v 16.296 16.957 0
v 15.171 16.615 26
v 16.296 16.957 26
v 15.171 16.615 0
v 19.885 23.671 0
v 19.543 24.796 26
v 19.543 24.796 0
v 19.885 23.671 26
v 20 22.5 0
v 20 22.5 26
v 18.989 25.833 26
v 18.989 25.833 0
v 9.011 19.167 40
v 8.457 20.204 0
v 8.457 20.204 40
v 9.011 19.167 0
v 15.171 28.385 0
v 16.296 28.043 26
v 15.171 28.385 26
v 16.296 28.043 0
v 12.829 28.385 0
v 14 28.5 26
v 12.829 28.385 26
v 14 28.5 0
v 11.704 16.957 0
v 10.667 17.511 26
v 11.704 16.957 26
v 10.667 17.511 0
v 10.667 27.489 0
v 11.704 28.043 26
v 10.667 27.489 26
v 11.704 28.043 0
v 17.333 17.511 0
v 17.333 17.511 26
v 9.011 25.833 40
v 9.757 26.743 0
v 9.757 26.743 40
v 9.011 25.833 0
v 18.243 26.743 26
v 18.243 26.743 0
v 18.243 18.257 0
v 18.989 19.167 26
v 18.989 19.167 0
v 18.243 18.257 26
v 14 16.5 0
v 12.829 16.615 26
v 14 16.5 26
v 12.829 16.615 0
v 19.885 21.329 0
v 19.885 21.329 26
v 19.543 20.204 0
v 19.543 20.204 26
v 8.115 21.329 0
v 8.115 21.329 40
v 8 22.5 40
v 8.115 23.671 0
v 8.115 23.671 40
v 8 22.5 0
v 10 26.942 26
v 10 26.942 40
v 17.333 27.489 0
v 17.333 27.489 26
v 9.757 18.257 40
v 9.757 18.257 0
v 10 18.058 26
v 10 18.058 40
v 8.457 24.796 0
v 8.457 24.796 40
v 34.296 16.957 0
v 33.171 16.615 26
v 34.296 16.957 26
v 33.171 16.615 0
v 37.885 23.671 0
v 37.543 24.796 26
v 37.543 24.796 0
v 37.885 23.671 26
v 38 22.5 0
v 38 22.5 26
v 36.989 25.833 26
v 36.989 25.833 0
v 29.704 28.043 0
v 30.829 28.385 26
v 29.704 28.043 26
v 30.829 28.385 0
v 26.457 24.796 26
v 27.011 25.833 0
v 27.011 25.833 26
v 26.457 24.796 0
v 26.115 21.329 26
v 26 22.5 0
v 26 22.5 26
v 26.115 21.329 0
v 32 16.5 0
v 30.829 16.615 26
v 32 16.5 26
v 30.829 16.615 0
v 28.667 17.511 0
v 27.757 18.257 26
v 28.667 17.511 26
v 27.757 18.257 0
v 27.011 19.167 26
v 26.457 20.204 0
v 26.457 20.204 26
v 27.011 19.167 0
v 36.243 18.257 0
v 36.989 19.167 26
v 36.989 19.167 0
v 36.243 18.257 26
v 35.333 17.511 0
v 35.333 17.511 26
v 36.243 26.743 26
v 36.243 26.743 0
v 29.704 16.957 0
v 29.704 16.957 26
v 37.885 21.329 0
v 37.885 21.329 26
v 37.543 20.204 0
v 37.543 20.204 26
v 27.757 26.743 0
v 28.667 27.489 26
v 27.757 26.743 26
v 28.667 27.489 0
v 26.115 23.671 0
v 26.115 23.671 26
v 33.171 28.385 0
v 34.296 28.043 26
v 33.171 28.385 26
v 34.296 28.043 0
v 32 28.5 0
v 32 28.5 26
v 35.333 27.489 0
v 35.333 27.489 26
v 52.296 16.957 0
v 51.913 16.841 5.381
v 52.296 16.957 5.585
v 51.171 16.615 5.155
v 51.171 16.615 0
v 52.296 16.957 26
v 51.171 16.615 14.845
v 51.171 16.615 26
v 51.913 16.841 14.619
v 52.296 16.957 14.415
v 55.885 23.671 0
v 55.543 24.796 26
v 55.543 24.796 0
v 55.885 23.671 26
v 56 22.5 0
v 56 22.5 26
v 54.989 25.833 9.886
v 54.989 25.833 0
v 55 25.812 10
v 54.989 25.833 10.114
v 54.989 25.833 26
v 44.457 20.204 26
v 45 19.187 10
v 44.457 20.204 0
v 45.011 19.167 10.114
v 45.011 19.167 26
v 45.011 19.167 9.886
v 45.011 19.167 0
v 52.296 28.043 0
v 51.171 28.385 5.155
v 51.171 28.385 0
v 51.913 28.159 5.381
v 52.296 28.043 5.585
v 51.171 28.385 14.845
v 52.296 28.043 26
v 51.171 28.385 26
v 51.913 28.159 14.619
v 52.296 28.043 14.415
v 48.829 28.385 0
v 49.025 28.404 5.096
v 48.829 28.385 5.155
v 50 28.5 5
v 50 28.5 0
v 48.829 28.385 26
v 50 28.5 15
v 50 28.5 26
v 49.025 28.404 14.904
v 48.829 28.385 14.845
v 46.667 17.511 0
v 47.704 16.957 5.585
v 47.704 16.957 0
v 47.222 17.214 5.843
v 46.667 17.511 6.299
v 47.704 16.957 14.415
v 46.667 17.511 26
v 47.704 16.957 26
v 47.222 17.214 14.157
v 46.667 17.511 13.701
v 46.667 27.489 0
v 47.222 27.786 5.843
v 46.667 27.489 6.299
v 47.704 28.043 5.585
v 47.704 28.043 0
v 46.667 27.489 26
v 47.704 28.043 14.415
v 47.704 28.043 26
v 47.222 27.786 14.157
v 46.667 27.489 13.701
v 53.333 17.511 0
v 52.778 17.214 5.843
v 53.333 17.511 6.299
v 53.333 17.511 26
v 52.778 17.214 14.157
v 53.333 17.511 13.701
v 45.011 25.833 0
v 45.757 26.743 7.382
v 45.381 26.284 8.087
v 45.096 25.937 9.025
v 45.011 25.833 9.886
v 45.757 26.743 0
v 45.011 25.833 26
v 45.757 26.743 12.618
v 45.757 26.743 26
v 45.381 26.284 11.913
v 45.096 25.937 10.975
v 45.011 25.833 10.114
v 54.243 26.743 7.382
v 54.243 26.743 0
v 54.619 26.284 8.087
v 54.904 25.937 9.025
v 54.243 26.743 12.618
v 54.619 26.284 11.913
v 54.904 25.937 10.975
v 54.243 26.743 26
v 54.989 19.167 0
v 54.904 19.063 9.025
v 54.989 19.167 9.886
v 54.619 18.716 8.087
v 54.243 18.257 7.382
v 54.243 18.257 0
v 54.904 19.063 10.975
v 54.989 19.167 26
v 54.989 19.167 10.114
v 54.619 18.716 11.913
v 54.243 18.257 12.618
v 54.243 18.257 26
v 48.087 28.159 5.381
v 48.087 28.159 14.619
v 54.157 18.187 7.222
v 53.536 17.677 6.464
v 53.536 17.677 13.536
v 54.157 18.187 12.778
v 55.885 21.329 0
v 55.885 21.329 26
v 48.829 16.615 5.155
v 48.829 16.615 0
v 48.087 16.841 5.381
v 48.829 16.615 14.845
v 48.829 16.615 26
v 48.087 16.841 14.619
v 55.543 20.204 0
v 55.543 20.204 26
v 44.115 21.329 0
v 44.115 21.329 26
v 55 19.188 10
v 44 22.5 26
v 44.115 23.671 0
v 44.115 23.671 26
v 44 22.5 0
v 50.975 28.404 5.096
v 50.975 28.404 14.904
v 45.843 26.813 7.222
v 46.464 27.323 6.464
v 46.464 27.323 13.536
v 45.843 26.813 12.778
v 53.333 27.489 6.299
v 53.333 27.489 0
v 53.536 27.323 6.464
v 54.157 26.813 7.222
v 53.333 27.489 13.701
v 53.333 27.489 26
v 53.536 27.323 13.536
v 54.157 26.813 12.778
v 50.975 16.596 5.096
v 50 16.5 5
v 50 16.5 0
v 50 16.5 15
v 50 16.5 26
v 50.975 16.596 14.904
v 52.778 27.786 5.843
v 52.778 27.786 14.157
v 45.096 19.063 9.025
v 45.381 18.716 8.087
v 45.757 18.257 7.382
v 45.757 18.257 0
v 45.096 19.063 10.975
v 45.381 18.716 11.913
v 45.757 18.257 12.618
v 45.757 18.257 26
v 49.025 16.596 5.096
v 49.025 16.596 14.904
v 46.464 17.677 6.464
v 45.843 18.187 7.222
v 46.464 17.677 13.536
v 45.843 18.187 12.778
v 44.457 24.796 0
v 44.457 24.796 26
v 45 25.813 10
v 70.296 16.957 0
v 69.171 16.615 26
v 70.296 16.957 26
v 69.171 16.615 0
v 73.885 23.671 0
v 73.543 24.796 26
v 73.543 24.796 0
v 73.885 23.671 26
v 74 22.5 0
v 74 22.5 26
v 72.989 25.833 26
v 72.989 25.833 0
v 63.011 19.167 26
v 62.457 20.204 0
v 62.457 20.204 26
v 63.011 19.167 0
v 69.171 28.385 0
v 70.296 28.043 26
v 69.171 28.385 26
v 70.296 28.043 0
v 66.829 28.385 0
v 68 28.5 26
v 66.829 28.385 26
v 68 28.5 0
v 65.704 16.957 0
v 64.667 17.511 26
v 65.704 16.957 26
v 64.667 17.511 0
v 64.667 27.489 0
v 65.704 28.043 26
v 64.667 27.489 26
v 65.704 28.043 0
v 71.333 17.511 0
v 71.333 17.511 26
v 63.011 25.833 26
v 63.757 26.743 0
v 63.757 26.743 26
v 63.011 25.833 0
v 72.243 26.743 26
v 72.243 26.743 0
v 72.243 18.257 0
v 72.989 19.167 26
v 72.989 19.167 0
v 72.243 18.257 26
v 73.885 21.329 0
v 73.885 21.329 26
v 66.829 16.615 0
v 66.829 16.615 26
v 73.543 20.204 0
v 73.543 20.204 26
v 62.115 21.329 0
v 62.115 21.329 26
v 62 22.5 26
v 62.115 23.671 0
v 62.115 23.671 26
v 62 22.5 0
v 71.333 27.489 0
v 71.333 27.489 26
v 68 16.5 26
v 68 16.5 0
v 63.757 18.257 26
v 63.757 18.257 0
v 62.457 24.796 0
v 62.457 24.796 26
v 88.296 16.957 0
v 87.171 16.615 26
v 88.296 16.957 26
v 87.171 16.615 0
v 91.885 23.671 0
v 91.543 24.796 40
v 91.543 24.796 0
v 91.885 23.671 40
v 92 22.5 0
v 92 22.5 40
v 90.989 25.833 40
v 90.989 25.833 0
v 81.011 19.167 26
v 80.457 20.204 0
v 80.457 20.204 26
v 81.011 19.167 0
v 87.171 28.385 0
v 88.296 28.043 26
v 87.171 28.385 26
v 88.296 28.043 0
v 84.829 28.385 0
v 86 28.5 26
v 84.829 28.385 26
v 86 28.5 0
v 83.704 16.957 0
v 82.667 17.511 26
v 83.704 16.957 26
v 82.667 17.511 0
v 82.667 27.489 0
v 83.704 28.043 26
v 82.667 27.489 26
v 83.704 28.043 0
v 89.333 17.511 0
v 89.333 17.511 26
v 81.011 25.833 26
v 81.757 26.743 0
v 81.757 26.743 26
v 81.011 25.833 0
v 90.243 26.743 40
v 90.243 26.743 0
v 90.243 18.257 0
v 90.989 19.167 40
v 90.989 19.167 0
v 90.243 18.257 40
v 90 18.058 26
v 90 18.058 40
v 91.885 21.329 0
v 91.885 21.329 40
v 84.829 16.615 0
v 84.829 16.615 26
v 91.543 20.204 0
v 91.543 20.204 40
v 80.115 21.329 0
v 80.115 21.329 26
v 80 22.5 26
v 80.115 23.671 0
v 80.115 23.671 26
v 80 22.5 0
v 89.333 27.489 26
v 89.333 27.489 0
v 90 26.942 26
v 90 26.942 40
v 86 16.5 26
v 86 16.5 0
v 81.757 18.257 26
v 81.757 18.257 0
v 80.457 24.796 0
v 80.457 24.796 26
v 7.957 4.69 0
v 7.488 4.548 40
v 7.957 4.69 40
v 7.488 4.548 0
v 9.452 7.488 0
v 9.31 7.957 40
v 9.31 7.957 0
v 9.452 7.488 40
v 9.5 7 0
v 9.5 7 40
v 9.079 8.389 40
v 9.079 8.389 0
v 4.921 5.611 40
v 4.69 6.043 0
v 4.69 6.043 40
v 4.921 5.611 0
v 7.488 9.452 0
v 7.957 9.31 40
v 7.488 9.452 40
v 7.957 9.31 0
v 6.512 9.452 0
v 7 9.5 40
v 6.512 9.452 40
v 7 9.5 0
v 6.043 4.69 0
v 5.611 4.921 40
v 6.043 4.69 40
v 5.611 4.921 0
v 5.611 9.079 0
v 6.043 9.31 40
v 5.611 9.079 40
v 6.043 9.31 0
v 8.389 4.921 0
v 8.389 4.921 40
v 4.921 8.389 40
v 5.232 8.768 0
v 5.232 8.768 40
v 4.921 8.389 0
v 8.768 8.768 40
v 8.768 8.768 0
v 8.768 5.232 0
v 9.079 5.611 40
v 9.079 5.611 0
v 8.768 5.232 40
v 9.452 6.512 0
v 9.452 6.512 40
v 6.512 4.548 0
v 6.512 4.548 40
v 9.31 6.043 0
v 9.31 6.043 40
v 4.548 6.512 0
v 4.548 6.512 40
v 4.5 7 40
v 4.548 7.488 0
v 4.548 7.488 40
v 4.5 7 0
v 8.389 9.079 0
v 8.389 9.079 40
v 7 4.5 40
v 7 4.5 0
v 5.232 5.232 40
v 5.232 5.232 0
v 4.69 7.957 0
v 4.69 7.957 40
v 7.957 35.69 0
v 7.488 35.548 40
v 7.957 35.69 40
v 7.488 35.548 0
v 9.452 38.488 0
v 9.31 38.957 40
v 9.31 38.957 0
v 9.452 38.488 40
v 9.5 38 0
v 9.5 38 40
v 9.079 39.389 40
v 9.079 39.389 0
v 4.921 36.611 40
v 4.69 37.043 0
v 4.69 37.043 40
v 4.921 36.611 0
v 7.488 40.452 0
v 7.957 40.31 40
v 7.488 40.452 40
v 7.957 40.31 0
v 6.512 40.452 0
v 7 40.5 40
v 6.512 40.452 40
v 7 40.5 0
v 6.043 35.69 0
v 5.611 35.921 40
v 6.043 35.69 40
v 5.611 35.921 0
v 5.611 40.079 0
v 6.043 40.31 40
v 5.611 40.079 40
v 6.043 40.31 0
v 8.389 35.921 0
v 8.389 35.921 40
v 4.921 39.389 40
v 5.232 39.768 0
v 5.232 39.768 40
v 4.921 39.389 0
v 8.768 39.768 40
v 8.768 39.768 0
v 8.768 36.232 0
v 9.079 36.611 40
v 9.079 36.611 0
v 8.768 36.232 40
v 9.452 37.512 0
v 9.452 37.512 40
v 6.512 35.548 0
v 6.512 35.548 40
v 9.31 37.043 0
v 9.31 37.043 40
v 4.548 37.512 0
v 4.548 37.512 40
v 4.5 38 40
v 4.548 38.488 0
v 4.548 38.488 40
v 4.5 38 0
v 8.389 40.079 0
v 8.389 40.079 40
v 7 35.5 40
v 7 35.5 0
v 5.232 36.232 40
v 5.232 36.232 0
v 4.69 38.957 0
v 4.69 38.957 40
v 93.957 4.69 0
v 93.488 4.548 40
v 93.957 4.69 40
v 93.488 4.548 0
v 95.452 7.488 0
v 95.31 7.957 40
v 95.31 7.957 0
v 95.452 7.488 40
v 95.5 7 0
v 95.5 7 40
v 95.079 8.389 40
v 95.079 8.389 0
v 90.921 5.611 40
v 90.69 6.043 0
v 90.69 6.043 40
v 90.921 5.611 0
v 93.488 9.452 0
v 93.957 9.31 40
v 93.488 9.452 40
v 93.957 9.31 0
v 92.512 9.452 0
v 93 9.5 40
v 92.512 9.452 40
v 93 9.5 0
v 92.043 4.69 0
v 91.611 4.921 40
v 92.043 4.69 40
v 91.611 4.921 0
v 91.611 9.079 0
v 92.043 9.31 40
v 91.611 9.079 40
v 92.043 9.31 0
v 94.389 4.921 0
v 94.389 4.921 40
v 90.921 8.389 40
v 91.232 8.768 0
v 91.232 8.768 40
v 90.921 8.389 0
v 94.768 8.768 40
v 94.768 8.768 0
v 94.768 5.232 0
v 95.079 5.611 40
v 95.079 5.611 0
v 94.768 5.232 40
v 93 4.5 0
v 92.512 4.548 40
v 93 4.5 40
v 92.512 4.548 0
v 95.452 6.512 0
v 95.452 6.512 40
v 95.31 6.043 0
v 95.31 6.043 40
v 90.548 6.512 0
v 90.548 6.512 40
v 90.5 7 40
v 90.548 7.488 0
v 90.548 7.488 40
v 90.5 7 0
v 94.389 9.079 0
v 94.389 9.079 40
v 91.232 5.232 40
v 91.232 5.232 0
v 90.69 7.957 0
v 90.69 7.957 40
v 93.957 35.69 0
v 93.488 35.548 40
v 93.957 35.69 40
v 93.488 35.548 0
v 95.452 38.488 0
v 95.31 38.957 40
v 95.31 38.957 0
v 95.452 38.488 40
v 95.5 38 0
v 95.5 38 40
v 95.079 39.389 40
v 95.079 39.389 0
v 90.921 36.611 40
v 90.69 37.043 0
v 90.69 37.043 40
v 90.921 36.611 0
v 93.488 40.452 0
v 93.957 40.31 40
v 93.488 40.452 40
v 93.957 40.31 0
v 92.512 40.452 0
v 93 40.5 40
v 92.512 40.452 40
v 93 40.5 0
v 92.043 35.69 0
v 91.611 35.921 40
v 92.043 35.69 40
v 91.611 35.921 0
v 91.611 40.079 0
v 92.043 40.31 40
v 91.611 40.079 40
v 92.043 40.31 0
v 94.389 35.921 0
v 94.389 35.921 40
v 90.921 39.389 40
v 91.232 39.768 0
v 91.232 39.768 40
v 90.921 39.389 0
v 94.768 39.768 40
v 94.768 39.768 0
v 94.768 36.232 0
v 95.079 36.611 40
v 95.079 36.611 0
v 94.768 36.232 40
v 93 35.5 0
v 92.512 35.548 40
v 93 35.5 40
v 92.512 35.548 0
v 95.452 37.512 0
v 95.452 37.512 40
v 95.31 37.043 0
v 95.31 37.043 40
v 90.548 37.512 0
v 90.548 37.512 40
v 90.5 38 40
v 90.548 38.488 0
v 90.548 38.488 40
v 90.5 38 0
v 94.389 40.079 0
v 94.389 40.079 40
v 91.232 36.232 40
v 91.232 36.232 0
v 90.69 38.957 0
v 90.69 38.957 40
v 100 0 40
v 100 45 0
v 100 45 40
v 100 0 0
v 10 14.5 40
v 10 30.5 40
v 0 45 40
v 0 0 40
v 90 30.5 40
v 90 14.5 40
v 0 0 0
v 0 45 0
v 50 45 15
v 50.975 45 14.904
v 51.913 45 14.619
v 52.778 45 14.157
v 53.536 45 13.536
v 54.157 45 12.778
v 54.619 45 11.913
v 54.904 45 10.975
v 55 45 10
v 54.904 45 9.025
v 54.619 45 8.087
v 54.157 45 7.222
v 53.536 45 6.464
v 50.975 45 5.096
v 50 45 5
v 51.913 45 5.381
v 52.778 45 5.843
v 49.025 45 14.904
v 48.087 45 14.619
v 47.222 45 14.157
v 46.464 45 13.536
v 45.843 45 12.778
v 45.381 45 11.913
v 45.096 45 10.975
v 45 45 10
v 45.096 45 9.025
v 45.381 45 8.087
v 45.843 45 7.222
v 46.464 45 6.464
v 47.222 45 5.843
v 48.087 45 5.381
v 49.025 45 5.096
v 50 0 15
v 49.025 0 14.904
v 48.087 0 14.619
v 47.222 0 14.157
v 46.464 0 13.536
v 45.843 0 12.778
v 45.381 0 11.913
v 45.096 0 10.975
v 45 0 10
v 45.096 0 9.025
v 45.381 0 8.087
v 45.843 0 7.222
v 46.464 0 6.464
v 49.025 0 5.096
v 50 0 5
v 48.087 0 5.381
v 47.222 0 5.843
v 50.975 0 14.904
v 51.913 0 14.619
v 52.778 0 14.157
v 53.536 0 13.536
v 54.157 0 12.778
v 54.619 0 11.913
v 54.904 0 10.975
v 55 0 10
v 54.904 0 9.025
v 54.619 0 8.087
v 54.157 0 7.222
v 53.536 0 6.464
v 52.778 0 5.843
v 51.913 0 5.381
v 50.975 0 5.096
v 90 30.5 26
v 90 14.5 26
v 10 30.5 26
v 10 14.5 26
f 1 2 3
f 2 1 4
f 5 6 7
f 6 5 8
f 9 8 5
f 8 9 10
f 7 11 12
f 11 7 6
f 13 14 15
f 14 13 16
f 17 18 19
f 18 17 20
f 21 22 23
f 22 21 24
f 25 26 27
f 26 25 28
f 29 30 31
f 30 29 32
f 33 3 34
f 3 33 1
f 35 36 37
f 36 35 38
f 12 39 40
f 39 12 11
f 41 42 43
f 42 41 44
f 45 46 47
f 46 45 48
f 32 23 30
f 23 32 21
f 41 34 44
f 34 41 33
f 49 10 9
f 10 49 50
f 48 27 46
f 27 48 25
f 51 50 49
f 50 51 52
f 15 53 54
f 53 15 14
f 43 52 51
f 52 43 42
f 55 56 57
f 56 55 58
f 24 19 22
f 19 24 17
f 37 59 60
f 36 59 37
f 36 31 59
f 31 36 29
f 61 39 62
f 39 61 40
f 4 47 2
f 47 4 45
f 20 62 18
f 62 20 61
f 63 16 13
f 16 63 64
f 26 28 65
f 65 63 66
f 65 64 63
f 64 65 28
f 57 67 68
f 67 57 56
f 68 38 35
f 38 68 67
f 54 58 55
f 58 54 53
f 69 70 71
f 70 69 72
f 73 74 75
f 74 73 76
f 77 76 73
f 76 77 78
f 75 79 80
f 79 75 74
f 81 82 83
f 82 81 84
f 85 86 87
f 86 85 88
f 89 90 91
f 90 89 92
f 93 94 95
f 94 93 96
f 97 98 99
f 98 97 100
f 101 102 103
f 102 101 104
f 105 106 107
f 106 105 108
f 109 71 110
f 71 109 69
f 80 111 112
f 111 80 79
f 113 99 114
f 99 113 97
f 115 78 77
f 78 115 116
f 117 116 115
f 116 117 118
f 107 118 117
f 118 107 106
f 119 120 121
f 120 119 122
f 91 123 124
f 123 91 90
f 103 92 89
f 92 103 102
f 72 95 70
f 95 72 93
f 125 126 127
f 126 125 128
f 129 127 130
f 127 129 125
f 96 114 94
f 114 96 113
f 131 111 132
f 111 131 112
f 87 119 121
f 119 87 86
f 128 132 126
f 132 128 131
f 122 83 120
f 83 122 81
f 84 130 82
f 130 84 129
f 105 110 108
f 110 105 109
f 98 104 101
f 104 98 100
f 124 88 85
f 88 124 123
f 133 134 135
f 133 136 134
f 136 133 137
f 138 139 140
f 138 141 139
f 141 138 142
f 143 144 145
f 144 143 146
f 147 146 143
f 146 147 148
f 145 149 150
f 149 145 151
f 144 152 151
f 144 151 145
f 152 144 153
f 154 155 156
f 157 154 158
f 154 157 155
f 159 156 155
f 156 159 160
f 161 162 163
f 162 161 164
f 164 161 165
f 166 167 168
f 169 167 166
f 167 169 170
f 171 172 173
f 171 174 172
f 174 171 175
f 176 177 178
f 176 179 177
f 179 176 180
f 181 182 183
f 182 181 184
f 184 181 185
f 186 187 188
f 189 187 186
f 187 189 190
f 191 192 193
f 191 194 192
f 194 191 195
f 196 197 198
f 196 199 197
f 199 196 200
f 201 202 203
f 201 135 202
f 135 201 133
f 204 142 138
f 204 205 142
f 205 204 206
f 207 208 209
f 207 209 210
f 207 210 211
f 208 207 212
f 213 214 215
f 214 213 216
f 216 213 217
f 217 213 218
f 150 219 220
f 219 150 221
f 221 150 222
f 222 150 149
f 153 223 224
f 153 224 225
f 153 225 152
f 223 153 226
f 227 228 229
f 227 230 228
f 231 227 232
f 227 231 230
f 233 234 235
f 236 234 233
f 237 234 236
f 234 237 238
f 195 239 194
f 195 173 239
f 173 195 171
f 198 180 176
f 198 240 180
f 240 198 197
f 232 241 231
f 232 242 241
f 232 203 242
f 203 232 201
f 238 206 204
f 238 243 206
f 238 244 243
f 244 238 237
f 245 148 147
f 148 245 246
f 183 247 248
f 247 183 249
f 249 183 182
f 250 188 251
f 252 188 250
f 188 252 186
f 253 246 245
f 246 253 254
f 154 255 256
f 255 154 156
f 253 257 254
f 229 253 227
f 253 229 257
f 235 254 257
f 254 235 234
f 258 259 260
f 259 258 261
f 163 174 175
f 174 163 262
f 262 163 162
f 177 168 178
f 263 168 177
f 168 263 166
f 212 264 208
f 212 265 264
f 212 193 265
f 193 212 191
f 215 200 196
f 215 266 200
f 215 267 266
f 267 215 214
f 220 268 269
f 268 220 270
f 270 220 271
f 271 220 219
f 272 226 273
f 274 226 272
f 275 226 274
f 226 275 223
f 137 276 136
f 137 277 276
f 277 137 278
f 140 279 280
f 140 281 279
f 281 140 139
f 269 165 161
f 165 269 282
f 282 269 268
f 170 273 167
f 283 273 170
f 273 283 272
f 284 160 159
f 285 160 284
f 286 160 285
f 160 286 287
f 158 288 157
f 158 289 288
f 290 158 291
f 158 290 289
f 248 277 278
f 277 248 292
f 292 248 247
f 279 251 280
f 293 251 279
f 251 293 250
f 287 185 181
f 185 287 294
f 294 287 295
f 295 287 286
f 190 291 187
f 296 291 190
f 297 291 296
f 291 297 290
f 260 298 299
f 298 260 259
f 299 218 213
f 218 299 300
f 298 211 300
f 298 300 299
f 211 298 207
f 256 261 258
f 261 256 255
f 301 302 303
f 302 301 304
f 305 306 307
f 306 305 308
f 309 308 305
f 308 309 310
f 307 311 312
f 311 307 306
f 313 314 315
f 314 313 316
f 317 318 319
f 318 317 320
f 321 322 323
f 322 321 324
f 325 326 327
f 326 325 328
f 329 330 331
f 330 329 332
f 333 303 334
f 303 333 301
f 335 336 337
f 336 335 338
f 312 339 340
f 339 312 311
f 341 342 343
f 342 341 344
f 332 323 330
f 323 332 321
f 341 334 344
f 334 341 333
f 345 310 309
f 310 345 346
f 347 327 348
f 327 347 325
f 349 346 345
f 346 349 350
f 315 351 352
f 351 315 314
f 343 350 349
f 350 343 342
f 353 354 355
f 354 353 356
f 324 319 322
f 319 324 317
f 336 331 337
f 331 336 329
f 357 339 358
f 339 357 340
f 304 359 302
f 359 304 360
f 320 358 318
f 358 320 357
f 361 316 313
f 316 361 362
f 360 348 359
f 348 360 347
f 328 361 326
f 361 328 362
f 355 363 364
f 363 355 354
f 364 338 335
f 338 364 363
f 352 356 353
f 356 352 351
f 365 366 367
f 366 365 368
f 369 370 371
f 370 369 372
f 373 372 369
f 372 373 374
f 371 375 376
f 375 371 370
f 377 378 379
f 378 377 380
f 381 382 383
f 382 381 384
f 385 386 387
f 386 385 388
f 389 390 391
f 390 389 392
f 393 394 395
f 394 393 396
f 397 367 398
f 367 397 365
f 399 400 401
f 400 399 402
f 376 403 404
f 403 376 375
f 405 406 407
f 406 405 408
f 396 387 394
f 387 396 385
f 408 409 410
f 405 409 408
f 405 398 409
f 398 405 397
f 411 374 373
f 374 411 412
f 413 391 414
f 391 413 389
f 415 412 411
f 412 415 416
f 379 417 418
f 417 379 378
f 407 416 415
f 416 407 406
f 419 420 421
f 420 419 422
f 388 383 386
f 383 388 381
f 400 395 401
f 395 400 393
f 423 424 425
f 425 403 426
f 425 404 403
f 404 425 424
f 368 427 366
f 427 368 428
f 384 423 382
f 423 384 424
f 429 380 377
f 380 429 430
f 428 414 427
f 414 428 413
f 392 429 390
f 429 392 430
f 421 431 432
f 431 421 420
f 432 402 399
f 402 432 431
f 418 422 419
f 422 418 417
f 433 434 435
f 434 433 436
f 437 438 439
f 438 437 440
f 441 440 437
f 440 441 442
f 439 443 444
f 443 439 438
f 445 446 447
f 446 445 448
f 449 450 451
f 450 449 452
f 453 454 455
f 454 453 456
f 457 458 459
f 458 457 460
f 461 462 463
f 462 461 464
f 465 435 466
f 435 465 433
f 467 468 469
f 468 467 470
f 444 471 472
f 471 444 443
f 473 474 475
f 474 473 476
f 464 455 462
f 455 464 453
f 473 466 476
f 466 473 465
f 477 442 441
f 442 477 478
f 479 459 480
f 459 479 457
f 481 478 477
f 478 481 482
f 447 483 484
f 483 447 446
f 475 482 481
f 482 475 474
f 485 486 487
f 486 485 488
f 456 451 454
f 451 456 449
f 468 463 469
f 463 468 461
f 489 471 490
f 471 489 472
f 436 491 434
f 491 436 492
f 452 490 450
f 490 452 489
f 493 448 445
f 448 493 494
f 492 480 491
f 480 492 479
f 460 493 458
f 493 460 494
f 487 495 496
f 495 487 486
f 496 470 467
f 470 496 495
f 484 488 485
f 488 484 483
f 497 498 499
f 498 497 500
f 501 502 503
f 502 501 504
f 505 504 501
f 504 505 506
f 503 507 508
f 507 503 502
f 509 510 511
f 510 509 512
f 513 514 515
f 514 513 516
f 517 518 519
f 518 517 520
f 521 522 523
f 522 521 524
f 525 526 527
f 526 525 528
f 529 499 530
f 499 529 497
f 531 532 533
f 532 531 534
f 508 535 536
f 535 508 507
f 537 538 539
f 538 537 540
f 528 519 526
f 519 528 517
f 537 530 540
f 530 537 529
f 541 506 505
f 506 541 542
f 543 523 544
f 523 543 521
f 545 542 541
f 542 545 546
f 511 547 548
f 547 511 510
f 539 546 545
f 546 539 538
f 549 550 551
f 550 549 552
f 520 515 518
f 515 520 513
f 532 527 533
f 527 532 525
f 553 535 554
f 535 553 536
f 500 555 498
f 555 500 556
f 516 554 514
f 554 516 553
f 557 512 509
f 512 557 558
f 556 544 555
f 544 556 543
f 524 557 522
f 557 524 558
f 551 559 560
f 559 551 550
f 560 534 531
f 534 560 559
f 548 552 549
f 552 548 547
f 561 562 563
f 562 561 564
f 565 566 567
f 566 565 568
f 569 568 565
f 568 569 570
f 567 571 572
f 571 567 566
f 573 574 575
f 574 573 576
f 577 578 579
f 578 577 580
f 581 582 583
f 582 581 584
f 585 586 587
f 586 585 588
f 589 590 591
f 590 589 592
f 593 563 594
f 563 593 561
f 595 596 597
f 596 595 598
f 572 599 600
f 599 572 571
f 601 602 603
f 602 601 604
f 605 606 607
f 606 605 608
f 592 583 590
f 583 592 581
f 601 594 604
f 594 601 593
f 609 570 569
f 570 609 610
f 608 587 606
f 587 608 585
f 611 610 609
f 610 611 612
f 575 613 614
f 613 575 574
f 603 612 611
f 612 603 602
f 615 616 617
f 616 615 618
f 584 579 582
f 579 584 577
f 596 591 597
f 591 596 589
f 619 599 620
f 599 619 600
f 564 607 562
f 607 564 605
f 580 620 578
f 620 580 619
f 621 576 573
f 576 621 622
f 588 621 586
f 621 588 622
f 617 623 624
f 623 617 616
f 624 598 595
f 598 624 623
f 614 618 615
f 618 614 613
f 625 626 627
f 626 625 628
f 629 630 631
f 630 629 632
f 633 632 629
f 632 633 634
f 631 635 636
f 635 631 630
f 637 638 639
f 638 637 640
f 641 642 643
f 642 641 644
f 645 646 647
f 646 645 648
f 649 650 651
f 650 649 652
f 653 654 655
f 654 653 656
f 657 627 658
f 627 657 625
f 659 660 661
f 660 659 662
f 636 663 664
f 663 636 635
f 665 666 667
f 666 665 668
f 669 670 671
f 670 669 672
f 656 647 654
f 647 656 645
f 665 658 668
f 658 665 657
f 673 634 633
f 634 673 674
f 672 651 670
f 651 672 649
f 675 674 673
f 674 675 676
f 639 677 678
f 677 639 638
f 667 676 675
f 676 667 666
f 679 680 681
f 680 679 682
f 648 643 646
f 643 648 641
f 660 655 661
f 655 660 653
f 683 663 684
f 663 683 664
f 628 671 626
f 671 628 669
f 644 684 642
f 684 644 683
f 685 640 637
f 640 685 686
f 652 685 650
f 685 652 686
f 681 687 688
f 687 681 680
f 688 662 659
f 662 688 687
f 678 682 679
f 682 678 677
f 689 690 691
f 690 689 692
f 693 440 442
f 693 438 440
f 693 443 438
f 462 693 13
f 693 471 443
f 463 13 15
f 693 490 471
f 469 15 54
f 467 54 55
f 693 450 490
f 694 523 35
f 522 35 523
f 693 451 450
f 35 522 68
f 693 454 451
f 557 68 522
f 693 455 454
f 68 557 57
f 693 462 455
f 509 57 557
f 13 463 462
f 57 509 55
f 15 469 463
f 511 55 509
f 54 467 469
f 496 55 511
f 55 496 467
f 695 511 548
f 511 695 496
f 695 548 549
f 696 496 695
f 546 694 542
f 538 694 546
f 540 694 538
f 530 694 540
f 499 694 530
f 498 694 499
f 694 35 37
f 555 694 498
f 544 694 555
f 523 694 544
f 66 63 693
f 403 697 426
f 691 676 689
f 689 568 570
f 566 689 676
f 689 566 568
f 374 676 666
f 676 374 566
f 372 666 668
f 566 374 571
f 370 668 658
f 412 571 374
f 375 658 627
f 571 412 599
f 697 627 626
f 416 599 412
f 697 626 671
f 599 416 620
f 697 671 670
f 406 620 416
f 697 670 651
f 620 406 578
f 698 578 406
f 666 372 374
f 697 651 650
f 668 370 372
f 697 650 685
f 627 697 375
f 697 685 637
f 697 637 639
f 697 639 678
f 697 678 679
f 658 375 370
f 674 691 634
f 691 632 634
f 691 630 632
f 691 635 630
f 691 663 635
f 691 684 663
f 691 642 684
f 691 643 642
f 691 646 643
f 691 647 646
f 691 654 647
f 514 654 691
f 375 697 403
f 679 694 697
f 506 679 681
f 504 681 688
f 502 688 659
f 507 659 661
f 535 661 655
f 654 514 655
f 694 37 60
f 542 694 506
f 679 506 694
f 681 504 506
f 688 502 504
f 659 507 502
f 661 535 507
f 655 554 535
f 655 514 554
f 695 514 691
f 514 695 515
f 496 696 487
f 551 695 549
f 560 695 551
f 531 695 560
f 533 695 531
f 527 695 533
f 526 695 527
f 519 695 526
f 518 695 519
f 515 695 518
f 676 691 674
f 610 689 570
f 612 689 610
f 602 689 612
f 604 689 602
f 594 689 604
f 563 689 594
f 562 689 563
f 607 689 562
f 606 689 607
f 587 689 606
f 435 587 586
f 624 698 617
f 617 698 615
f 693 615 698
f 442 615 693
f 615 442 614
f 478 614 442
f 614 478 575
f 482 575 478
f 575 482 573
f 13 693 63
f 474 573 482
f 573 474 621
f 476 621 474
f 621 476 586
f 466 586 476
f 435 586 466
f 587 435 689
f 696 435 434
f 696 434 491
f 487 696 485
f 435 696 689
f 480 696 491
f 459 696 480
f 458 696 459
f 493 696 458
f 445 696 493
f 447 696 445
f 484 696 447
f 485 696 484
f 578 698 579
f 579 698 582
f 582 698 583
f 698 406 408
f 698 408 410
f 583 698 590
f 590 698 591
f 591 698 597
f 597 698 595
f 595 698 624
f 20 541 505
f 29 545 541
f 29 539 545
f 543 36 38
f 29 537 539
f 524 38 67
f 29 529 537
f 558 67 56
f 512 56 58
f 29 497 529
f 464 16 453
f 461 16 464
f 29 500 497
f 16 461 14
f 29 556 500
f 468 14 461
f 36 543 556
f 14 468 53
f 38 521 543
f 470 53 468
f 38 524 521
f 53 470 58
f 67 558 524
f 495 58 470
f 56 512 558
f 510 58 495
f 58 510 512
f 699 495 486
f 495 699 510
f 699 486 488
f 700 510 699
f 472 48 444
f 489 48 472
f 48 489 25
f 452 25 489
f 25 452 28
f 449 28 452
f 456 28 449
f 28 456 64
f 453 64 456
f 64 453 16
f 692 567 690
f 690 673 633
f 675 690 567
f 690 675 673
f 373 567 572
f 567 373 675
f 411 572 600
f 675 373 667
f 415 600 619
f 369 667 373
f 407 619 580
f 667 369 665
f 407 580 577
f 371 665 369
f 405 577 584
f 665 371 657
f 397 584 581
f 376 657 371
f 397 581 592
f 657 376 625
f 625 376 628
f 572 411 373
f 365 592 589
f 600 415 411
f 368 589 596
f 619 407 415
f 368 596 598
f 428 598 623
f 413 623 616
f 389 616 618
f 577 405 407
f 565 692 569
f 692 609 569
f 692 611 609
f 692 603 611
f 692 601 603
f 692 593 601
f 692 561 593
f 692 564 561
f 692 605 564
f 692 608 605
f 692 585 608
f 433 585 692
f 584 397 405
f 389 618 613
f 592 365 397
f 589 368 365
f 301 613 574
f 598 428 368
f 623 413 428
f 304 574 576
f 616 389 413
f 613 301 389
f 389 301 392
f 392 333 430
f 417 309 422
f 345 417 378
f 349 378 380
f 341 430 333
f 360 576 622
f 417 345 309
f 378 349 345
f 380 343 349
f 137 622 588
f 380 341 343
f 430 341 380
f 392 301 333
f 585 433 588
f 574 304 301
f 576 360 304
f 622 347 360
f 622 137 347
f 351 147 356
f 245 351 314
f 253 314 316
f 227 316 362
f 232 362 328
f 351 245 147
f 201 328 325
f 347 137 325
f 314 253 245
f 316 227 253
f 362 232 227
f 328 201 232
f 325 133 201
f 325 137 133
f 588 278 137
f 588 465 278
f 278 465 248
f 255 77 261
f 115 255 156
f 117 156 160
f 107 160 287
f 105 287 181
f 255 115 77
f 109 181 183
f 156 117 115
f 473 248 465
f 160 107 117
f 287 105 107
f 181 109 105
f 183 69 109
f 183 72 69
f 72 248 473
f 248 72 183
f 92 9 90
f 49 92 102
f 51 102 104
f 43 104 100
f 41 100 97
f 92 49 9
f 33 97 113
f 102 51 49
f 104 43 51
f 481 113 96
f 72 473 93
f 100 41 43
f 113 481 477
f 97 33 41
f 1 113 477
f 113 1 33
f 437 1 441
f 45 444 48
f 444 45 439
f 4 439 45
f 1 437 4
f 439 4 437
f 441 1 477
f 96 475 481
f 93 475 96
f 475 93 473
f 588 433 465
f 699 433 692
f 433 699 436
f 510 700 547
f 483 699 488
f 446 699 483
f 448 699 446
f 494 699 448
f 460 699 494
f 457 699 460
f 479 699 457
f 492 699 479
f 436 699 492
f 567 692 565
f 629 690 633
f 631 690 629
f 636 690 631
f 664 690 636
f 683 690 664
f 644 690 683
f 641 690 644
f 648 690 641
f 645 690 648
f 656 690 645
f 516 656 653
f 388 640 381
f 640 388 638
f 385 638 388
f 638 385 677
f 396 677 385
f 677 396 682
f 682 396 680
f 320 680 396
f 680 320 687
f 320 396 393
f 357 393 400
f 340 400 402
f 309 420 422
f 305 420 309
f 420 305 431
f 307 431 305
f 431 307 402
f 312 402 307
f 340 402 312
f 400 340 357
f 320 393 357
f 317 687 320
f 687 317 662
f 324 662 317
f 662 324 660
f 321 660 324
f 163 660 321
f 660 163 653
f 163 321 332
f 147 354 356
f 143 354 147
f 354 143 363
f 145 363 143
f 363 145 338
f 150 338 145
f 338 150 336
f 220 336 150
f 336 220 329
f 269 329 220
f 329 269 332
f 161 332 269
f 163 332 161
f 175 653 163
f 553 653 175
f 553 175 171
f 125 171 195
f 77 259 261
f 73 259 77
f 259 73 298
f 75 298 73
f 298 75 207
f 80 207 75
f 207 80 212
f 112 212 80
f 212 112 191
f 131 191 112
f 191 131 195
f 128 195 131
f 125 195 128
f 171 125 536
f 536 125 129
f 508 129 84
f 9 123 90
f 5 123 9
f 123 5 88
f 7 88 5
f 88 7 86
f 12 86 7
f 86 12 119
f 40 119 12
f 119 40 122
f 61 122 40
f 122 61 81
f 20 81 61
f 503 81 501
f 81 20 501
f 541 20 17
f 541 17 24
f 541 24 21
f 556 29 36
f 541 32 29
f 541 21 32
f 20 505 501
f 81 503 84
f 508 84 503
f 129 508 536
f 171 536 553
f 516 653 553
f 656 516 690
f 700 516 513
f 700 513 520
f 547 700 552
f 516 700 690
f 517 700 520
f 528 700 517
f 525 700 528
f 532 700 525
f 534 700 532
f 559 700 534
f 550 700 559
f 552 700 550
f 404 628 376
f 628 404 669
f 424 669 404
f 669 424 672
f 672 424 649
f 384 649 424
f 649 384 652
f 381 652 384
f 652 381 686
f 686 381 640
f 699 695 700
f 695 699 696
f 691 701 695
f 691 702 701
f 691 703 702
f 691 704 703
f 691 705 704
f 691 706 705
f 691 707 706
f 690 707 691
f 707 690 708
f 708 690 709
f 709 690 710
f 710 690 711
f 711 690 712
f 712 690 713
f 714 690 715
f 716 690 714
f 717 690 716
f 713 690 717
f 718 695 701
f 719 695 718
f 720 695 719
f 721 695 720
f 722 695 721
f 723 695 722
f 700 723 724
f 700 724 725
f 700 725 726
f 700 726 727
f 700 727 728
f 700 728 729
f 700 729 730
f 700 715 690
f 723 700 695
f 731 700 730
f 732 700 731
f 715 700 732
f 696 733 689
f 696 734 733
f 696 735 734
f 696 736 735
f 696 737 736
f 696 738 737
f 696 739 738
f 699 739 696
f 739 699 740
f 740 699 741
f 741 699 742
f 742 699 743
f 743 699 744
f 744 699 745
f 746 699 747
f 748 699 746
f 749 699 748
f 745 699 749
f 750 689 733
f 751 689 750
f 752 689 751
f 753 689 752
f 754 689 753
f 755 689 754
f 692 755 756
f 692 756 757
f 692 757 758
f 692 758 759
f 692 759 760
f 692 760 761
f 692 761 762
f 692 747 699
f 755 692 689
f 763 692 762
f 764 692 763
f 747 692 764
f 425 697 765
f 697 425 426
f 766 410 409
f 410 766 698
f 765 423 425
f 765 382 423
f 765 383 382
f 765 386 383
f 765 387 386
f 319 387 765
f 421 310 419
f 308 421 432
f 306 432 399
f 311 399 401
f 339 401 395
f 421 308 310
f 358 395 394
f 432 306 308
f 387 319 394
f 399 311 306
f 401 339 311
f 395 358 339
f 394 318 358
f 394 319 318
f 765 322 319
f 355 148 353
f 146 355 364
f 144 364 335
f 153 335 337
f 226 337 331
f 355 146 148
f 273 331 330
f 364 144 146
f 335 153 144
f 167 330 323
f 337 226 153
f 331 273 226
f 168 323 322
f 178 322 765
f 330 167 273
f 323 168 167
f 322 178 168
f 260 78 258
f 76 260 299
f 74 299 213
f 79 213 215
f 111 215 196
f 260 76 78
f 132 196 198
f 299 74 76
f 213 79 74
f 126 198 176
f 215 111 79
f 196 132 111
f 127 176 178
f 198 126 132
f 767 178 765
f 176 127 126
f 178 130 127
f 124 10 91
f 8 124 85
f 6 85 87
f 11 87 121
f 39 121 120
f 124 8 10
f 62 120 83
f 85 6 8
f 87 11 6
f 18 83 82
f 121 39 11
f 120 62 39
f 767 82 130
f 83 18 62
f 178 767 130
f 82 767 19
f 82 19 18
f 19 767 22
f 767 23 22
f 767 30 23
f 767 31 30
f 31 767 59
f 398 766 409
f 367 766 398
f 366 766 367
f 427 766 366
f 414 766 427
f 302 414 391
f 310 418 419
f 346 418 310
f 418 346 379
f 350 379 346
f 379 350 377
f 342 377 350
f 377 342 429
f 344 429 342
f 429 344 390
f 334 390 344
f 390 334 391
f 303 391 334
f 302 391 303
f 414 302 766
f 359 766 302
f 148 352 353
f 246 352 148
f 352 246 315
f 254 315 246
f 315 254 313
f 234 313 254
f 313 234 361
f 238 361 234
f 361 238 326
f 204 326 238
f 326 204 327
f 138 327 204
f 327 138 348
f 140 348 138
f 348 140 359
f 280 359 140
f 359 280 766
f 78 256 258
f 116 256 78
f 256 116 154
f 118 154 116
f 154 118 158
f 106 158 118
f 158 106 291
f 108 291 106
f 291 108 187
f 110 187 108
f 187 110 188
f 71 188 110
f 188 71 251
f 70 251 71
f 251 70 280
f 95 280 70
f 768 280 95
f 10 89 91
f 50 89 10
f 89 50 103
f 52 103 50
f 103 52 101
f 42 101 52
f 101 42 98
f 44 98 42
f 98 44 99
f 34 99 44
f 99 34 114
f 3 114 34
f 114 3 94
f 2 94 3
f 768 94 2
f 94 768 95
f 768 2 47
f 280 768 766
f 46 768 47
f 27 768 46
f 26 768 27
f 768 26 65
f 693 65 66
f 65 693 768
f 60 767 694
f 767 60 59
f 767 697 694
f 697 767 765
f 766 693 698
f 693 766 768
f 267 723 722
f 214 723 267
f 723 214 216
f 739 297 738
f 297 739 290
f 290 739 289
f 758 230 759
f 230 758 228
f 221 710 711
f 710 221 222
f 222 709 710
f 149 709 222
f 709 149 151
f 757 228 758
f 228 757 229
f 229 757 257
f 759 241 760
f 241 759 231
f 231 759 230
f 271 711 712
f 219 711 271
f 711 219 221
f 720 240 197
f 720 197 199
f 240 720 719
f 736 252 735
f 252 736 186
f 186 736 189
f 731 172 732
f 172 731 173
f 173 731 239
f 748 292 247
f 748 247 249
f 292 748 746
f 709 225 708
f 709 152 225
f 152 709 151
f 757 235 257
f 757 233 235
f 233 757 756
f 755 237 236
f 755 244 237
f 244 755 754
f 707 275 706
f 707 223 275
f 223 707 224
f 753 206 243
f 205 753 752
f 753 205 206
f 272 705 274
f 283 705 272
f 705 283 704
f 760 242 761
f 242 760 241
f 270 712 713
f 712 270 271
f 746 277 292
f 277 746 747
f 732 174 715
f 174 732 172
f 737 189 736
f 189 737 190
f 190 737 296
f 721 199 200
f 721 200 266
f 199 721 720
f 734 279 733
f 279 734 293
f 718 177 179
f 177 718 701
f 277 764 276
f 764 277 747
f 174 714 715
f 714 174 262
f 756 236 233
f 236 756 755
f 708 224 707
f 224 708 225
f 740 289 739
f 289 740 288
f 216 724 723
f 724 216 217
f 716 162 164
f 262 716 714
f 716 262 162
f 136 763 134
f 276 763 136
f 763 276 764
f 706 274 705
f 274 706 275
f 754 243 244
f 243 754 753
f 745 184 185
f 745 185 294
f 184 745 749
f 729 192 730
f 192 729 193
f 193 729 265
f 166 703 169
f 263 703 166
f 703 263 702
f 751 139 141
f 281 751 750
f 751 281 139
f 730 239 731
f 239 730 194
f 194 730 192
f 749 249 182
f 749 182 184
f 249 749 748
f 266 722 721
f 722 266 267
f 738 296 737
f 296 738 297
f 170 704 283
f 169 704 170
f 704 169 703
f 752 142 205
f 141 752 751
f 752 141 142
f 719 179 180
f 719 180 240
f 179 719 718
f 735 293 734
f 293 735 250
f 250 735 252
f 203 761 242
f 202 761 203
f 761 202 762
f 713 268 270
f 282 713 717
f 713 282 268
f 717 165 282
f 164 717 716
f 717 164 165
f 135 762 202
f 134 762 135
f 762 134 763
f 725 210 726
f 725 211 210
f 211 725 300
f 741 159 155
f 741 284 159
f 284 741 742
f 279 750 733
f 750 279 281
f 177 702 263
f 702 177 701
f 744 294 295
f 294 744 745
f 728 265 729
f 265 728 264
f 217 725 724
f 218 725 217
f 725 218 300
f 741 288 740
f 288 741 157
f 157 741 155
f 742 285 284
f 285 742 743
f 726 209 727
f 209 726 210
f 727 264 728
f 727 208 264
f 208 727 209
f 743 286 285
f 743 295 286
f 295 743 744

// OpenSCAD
$fn = 32;

// ----------------------------------------------------------------------
// Manifold block: side_outlet manifold
// ----------------------------------------------------------------------

// --- parameters (mm) ---
block_l = 100;            // block length, X
block_w = 45;             // block width, Y
block_h = 40;             // block height, Z
port_d = 12;              // port bore diameter
port_pitch = 18;          // port pitch along X
gallery_d = 16;           // top gallery width, Y
gallery_depth = 14;       // gallery pocket depth
wall_p = 10;              // gallery end wall thickness, X
mnt_d = 5;                // mounting hole diameter
mnt_in = 7;               // mounting hole inset from the edges
out_d = 10;               // outlet bore diameter
out_z = 10;               // outlet axis height
fit_tol = 0.02;           // tolerance for press fits, mm
free_tol = 0.2;           // tolerance for clearance fits, mm

n_ports = 5;  // ports in the row
port_x0 = (block_l - (n_ports - 1) * port_pitch) / 2;  // first port X

difference() {
  cube([block_l, block_w, block_h]);
  for (i = [0 : n_ports - 1])
    translate([port_x0 + i * port_pitch, block_w / 2, -1])
      cylinder(h = block_h + 2, d = port_d);
  translate([wall_p, block_w / 2 - gallery_d / 2, block_h - gallery_depth])
    cube([block_l - 2 * wall_p, gallery_d, gallery_depth + 1]);
  for (cx = [mnt_in, block_l - mnt_in])
    for (cy = [mnt_in, block_w - mnt_in])
      translate([cx, cy, -1]) cylinder(h = block_h + 2, d = mnt_d);
  translate([block_l / 2, -1, out_z]) rotate([-90, 0, 0])
    cylinder(h = block_w + 2, d = out_d);
}
